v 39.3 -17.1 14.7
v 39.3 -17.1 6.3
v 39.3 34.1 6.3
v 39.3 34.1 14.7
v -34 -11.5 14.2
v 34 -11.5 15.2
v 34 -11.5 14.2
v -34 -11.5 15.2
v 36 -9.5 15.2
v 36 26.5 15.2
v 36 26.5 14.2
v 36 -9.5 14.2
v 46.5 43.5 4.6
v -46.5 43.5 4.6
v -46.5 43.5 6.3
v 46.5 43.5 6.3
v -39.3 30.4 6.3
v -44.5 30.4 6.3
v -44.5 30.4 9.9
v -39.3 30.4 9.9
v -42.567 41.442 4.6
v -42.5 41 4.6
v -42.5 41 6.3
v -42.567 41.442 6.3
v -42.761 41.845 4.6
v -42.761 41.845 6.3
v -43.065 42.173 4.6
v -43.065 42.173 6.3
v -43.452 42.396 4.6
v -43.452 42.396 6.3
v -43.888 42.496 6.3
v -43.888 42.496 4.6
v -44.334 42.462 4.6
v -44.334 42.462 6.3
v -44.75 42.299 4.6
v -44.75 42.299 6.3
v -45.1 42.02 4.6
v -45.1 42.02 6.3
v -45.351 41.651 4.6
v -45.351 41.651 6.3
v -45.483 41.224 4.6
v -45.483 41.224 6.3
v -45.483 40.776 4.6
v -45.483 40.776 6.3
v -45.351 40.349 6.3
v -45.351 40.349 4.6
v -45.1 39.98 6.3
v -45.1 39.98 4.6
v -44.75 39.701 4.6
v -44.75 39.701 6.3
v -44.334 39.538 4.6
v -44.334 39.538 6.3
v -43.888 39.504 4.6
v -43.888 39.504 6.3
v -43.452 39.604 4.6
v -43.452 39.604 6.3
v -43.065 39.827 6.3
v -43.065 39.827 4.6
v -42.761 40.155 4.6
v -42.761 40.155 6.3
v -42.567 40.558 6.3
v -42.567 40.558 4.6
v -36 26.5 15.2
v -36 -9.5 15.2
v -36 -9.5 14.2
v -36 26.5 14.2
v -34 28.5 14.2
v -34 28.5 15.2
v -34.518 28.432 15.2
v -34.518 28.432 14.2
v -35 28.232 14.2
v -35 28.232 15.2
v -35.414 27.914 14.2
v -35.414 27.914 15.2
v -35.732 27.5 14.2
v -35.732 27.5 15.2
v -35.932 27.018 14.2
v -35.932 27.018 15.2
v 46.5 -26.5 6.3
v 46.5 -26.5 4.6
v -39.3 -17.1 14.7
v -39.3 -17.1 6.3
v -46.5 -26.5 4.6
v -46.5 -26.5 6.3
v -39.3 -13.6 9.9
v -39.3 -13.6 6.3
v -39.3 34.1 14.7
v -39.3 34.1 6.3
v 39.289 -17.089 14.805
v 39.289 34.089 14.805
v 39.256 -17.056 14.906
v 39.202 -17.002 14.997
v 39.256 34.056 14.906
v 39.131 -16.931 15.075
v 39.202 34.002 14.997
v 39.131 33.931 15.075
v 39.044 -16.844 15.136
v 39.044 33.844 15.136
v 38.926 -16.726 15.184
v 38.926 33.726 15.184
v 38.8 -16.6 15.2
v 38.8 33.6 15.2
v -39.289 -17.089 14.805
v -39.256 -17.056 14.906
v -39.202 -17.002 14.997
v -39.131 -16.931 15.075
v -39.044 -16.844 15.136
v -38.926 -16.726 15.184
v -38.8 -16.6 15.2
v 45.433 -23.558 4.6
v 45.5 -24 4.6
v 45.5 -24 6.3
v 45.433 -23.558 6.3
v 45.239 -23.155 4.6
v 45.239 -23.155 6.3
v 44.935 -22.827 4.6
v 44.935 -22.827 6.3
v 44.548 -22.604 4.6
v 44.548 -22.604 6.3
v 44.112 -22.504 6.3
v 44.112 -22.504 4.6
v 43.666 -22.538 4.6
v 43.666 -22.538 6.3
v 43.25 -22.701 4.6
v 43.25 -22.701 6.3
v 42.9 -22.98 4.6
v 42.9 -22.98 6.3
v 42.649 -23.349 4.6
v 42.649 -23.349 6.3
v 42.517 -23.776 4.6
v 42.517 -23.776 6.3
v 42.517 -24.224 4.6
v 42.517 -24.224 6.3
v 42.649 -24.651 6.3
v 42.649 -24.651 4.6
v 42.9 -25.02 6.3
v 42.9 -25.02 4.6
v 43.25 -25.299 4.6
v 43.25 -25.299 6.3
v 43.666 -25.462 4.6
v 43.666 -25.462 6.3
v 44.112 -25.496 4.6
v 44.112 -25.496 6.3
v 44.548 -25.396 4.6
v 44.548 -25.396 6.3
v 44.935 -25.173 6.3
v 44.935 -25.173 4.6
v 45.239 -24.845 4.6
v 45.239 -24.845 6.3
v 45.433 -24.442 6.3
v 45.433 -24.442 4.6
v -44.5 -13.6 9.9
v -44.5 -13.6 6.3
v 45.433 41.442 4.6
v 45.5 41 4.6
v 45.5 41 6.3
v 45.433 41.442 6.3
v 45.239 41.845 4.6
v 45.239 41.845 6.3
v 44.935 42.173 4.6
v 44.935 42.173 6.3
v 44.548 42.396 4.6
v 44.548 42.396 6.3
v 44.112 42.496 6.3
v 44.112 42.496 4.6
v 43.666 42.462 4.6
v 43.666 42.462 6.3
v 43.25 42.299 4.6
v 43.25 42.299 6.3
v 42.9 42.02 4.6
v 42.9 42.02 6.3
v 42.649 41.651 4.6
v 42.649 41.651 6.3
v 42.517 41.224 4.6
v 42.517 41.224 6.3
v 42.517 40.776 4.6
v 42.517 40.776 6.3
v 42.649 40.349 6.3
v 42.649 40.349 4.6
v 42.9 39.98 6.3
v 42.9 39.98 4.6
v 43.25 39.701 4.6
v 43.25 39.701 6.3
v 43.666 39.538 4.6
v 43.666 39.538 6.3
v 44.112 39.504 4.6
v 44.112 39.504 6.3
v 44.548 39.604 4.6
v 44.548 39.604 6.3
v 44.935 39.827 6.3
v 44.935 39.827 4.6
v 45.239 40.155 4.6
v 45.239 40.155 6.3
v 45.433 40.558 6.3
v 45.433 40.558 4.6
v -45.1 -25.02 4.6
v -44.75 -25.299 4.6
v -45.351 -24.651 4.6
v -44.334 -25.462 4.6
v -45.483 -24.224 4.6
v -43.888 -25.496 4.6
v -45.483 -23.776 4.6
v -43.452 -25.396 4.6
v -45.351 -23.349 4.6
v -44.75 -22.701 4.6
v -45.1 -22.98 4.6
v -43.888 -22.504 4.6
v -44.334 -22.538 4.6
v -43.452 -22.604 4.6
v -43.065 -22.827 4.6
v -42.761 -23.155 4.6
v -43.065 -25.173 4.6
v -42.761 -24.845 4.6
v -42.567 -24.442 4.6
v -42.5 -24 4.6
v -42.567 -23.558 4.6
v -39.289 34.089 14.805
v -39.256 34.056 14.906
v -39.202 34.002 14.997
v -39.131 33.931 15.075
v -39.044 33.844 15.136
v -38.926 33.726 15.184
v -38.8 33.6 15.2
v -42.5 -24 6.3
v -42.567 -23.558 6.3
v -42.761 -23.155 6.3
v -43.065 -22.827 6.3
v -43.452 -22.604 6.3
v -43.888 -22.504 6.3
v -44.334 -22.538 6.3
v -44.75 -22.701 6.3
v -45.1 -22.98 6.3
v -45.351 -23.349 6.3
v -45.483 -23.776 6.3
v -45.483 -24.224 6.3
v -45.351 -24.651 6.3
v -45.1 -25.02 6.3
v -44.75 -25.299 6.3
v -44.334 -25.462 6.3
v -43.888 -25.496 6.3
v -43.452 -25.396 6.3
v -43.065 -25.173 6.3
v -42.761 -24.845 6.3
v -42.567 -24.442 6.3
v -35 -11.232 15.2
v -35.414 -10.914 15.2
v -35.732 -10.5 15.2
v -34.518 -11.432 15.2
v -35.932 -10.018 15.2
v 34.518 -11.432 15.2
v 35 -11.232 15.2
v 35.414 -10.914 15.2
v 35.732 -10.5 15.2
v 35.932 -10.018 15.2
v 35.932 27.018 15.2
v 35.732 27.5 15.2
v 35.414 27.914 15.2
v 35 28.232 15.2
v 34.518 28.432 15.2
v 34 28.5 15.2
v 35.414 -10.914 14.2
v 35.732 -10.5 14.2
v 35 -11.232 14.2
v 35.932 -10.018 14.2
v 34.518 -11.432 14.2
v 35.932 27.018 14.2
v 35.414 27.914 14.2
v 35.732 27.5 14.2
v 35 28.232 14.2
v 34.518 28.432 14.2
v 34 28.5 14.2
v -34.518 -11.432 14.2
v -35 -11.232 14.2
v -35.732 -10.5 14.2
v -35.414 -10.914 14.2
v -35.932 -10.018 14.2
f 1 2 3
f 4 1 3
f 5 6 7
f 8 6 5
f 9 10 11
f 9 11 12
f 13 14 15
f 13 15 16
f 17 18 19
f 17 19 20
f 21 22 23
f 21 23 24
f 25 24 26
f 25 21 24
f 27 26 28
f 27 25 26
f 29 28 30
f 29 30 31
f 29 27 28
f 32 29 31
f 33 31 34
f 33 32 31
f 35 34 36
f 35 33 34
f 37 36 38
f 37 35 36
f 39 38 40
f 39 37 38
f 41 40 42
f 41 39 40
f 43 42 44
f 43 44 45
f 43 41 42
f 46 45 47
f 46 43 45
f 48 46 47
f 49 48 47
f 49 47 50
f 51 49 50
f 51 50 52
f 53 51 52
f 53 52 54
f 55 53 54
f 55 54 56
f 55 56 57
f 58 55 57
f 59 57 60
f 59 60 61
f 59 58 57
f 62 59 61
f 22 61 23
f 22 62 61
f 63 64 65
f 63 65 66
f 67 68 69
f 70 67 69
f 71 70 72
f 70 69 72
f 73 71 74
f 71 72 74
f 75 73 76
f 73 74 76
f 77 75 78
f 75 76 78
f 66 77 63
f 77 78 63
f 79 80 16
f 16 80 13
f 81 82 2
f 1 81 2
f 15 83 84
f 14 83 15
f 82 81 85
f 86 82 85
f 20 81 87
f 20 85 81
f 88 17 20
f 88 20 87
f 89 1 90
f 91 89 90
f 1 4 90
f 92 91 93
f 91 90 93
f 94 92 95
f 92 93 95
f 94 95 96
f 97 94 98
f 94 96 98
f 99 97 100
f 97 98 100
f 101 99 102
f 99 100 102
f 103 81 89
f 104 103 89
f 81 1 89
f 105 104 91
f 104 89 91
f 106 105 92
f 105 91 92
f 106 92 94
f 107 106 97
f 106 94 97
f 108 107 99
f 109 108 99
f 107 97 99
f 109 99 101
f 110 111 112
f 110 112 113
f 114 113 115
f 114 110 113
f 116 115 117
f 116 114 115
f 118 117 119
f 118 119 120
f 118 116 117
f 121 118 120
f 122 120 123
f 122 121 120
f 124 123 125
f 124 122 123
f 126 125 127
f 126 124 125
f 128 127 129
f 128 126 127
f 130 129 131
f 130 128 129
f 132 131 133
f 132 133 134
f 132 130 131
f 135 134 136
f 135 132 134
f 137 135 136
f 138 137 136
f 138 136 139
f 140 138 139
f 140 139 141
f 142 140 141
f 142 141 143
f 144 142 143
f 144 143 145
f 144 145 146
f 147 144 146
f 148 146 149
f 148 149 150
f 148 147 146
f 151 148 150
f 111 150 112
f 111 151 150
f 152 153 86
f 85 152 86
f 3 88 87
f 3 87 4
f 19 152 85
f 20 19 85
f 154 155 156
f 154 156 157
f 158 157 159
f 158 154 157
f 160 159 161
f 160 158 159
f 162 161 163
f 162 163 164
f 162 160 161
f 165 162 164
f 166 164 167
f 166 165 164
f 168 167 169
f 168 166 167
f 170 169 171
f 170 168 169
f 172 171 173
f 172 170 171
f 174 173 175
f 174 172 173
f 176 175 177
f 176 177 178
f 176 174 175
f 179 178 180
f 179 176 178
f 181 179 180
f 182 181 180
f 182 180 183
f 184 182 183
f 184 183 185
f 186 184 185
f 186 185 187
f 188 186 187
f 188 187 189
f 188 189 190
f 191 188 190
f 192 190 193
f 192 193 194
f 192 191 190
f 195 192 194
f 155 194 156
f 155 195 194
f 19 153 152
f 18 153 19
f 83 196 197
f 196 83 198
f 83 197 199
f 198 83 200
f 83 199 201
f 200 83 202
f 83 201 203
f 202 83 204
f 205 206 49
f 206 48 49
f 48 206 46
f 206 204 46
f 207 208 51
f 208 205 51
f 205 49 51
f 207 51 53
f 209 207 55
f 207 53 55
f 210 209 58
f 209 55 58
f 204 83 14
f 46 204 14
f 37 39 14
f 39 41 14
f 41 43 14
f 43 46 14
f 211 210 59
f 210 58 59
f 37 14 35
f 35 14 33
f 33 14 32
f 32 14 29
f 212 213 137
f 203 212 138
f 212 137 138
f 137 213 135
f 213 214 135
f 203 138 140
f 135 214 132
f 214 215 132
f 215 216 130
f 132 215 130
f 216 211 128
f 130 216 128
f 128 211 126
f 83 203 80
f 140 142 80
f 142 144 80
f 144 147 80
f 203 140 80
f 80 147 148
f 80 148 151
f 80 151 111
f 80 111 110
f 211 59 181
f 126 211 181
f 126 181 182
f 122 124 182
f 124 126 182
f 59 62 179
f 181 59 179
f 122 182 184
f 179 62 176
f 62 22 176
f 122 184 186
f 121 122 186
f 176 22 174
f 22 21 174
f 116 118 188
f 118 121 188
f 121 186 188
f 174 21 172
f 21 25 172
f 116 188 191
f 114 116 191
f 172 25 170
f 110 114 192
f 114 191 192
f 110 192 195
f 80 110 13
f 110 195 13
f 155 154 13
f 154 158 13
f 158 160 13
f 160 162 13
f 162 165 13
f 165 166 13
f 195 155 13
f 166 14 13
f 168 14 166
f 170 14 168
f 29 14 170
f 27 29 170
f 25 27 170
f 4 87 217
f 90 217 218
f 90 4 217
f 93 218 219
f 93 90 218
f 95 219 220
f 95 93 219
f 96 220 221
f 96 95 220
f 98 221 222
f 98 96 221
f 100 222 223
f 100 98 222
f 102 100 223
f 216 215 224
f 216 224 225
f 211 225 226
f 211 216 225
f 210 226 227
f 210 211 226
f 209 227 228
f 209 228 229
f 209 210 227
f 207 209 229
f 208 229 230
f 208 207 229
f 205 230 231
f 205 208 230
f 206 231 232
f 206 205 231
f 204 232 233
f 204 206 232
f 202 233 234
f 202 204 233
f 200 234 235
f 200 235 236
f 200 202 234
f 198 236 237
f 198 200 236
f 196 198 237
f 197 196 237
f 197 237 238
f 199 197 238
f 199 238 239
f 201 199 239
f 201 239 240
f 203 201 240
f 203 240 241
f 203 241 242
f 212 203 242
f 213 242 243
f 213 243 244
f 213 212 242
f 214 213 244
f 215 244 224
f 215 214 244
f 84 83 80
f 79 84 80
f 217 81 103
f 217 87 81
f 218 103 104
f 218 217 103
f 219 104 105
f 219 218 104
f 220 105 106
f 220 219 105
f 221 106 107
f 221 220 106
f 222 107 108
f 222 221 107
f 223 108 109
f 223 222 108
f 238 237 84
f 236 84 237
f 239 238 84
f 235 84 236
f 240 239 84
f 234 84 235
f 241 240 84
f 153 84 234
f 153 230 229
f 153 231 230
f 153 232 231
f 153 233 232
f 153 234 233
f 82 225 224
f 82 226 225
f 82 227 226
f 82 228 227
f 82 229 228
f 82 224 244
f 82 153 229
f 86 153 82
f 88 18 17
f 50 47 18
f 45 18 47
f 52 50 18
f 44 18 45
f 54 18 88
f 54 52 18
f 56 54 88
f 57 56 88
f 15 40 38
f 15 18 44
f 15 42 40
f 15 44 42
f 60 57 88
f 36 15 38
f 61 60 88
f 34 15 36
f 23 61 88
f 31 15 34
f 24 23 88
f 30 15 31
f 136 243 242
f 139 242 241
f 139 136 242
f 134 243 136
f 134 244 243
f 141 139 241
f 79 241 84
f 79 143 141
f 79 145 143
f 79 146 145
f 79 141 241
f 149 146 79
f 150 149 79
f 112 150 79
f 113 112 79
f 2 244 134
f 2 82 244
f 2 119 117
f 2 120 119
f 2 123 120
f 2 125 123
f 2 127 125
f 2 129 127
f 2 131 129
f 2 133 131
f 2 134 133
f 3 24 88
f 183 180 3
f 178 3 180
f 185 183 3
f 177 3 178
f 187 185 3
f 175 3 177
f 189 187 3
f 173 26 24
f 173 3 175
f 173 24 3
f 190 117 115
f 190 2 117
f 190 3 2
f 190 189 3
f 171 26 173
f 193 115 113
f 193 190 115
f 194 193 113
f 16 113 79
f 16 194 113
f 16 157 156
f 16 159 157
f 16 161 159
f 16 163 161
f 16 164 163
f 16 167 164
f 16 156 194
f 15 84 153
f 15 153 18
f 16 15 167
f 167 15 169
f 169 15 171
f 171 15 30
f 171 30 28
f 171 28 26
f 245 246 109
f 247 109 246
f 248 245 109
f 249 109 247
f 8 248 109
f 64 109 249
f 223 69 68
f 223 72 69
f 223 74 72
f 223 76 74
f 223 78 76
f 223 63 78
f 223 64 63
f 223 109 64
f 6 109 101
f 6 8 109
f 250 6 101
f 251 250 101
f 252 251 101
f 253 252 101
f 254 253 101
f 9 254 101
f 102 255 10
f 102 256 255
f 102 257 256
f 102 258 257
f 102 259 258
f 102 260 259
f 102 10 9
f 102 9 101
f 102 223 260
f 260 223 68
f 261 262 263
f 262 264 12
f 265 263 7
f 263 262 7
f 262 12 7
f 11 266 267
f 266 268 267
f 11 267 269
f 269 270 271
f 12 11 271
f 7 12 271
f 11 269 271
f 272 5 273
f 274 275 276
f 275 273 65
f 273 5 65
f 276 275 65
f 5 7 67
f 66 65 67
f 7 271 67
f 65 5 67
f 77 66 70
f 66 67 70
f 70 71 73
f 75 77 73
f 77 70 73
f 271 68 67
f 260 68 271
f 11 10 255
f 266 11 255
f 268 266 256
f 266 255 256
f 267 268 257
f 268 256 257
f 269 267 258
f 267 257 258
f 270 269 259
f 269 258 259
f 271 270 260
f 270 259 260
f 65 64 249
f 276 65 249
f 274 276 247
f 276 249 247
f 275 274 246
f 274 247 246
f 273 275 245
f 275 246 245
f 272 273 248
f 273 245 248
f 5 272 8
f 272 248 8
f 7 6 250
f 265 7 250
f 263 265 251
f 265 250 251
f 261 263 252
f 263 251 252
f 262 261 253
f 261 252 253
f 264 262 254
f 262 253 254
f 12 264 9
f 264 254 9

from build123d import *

# Parameters (mm, degrees)
SKETCH001004_W  = 93
SKETCH001004_H  = 70
SKETCH001004_R  = 1.5
PAD002_DEPTH    = 1.7
SKETCH001005_W  = 78.6
SKETCH001005_H  = 51.2
PAD003_DEPTH    = 8.9
SKETCH001006_W  = 7
SKETCH001006_H  = 44
PAD004_DEPTH    = 3.6
FILLET003_R     = 0.5
POCKET002_DEPTH = 1


with BuildPart() as part:
    # Sketch001004 → Pad002 (new body)
    with BuildSketch(Plane.XY.offset(4.6)):
        with Locations((0, 8.5)):
            Rectangle(SKETCH001004_W, SKETCH001004_H)
        with Locations((-44, 41)):
            Circle(SKETCH001004_R, mode=Mode.SUBTRACT)
        with Locations((44, 41)):
            Circle(SKETCH001004_R, mode=Mode.SUBTRACT)
        with Locations((-44, -24)):
            Circle(SKETCH001004_R, mode=Mode.SUBTRACT)
        with Locations((44, -24)):
            Circle(SKETCH001004_R, mode=Mode.SUBTRACT)
    extrude(amount=PAD002_DEPTH)

    # Sketch001005 → Pad003 (new body)
    with BuildSketch(Plane.XY.offset(6.3)):
        with Locations((0, 8.5)):
            Rectangle(SKETCH001005_W, SKETCH001005_H)
    extrude(amount=PAD003_DEPTH)

    # Sketch001006 → Pad004 (new body)
    with BuildSketch(Plane.XY.offset(6.3)):
        with Locations((-41, 8.4)):
            Rectangle(SKETCH001006_W, SKETCH001006_H)
    extrude(amount=PAD004_DEPTH)

    # Fillet003
    fillet003_edges = [part.edges().sort_by_distance(p)[0] for p in [
        (0, -17.1, 15.2),
        (39.3, 8.5, 15.2),
        (0, 34.1, 15.2),
        (-39.3, 8.5, 15.2),
    ]]
    fillet(fillet003_edges, radius=FILLET003_R)

    # Sketch001014 → Pocket002 (cut)
    with BuildSketch(Plane.XY.offset(15.2)):
        with BuildLine():
            Line((-34, 28.5), (34, 28.5))
            ThreePointArc((36, 26.5), (35.414214, 27.914214), (34, 28.5))
            Line((36, 26.5), (36, -9.5))
            ThreePointArc((34, -11.5), (35.414214, -10.914214), (36, -9.5))
            Line((34, -11.5), (-34, -11.5))
            ThreePointArc((-36, -9.5), (-35.414214, -10.914214), (-34, -11.5))
            Line((-36, -9.5), (-36, 26.5))
            ThreePointArc((-34, 28.5), (-35.414214, 27.914214), (-36, 26.5))
        make_face()
    extrude(amount=-POCKET002_DEPTH, mode=Mode.SUBTRACT)


solid = part.part
